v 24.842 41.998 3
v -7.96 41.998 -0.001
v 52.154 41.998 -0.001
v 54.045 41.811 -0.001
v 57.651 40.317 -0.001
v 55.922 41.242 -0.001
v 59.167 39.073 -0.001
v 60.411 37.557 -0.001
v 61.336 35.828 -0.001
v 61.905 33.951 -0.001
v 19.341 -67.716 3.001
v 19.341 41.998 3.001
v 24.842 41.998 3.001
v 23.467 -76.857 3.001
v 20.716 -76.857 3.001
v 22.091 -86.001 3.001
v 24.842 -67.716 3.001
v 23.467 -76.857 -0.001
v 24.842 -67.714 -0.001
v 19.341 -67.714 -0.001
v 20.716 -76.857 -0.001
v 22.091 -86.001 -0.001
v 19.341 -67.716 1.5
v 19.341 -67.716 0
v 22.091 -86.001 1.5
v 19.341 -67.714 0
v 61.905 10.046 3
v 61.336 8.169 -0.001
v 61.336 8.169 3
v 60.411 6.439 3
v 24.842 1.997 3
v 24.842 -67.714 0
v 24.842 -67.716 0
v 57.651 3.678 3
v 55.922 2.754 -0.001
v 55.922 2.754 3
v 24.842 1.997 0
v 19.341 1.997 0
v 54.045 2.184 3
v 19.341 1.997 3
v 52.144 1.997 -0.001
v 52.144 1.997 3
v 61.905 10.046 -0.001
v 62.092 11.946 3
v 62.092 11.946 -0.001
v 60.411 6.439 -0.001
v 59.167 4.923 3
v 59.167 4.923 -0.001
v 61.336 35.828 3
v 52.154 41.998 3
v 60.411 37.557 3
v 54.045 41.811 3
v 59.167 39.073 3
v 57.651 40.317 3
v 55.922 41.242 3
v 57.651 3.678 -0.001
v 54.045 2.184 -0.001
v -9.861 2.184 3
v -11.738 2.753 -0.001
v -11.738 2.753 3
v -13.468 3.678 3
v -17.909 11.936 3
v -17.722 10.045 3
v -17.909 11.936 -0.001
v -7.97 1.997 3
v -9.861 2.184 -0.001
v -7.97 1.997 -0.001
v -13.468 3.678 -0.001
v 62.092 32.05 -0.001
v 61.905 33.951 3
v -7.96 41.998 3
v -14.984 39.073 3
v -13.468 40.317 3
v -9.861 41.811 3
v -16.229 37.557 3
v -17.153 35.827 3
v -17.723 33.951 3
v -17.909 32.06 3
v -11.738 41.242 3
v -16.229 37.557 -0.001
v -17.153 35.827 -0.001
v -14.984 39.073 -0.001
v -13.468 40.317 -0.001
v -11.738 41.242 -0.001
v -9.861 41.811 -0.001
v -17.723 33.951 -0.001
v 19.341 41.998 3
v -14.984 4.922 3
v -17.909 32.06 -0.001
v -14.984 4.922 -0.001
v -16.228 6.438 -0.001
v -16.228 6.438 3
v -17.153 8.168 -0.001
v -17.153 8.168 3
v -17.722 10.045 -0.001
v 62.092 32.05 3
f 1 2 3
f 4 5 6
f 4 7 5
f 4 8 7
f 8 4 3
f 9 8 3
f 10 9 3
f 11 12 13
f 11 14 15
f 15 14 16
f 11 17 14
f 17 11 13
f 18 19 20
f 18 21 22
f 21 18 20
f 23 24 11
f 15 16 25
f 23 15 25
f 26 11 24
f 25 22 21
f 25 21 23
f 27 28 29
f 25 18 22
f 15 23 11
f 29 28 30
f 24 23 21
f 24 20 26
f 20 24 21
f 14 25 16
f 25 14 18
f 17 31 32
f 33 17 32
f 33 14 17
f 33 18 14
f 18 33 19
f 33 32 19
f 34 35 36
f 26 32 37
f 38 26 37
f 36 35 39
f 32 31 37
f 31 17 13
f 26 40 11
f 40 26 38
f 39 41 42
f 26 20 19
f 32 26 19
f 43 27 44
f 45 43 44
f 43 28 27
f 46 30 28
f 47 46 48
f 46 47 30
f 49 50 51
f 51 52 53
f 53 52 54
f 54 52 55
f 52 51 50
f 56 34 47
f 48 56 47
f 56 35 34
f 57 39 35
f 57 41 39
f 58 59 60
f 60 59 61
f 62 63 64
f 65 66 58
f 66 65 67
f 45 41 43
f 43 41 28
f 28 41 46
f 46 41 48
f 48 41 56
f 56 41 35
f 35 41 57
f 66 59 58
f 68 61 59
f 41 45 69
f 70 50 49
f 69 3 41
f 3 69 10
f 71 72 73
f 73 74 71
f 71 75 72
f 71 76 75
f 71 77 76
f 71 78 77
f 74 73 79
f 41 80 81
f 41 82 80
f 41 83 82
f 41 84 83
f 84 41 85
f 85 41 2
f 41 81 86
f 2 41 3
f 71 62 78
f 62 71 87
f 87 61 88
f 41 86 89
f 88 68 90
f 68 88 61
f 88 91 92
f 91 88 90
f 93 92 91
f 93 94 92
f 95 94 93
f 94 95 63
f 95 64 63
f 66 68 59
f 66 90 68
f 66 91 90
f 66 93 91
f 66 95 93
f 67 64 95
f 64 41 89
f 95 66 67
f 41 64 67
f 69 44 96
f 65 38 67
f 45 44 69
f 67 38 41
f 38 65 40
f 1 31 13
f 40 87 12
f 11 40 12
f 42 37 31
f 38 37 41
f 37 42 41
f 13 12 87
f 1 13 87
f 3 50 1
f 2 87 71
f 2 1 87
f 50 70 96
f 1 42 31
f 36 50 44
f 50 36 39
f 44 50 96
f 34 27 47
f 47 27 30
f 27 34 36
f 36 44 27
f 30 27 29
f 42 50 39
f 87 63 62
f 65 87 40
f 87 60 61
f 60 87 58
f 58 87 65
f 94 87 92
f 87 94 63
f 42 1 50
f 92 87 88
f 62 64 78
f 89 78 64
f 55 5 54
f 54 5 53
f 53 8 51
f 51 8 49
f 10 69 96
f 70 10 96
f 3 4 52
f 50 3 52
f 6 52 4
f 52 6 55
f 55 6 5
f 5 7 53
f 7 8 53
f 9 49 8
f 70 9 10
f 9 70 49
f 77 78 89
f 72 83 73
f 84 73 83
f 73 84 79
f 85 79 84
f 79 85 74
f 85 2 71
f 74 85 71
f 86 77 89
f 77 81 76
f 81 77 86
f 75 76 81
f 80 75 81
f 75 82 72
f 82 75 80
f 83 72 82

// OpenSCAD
module object1(scale) {polyhedron(
 points=[[52.153682708740234,41.99800109863281,-0.0010000000474974513],[-7.959833145141602,41.99800109863281,-0.0010000000474974513],[24.841999053955078,41.99800109863281,3],[24.841999053955078,-67.71600341796875,3.000999927520752],[24.841999053955078,41.99800109863281,3.000999927520752],[24.841699600219727,-67.71600341796875,3.000999927520752],[55.922000885009766,41.242000579833984,-0.0010000000474974513],[57.6510009765625,40.31700134277344,-0.0010000000474974513],[54.04499816894531,41.81100082397461,-0.0010000000474974513],[57.6510009765625,40.31700134277344,-0.0010000000474974513],[59.16699981689453,39.073001861572266,-0.0010000000474974513],[54.04499816894531,41.81100082397461,-0.0010000000474974513],[59.16699981689453,39.073001861572266,-0.0010000000474974513],[60.4109992980957,37.55699920654297,-0.0010000000474974513],[54.04499816894531,41.81100082397461,-0.0010000000474974513],[52.153682708740234,41.99800109863281,-0.0010000000474974513],[54.04499816894531,41.81100082397461,-0.0010000000474974513],[60.4109992980957,37.55699920654297,-0.0010000000474974513],[52.153682708740234,41.99800109863281,-0.0010000000474974513],[60.4109992980957,37.55699920654297,-0.0010000000474974513],[61.33599853515625,35.827999114990234,-0.0010000000474974513],[52.153682708740234,41.99800109863281,-0.0010000000474974513],[61.33599853515625,35.827999114990234,-0.0010000000474974513],[61.904998779296875,33.95100021362305,-0.0010000000474974513],[24.841999053955078,41.99800109863281,3.000999927520752],[19.340999603271484,41.99800109863281,3.000999927520752],[19.34130096435547,-67.71600341796875,3.000999927520752],[20.715999603271484,-76.85700225830078,3.000999927520752],[23.466999053955078,-76.85700225830078,3.000999927520752],[19.34130096435547,-67.71600341796875,3.000999927520752],[22.090999603271484,-86.0009994506836,3.000999927520752],[23.466999053955078,-76.85700225830078,3.000999927520752],[20.715999603271484,-76.85700225830078,3.000999927520752],[23.466999053955078,-76.85700225830078,3.000999927520752],[24.841699600219727,-67.71600341796875,3.000999927520752],[19.34130096435547,-67.71600341796875,3.000999927520752],[24.841999053955078,41.99800109863281,3.000999927520752],[19.34130096435547,-67.71600341796875,3.000999927520752],[24.841699600219727,-67.71600341796875,3.000999927520752],[19.340999603271484,-67.71399688720703,-0.0010000000474974513],[24.841999053955078,-67.71399688720703,-0.0010000000474974513],[23.466999053955078,-76.85700225830078,-0.0010000000474974513],[22.090999603271484,-86.0009994506836,-0.0010000000474974513],[20.715999603271484,-76.85700225830078,-0.0010000000474974513],[23.466999053955078,-76.85700225830078,-0.0010000000474974513],[19.340999603271484,-67.71399688720703,-0.0010000000474974513],[23.466999053955078,-76.85700225830078,-0.0010000000474974513],[20.715999603271484,-76.85700225830078,-0.0010000000474974513],[19.34130096435547,-67.71600341796875,0],[19.34130096435547,-67.71600341796875,1.5],[19.340999603271484,-67.71600341796875,0],[19.340999603271484,-67.71600341796875,3.000999927520752],[19.340999603271484,-67.71600341796875,0],[19.34130096435547,-67.71600341796875,1.5],[19.340999603271484,-67.71600341796875,3.000999927520752],[19.34130096435547,-67.71600341796875,1.5],[19.34130096435547,-67.71600341796875,1.5003283023834229],[19.340999603271484,-67.71600341796875,3.000999927520752],[19.34130096435547,-67.71600341796875,1.5003283023834229],[19.34130096435547,-67.71600341796875,3.000999927520752],[22.090999603271484,-86.0009994506836,1.5],[22.090999603271484,-86.0009994506836,3.000999927520752],[20.715999603271484,-76.85700225830078,3.000999927520752],[22.090999603271484,-86.0009994506836,1.5],[20.715999603271484,-76.85700225830078,3.000999927520752],[19.34130096435547,-67.71600341796875,1.5],[19.34130096435547,-67.71600341796875,1.5003283023834229],[19.34130096435547,-67.71600341796875,1.5],[20.715999603271484,-76.85700225830078,3.000999927520752],[19.34130096435547,-67.71600341796875,1.4996716976165771],[19.34130096435547,-67.71600341796875,1.5],[19.34130096435547,-67.71600341796875,0],[19.340999603271484,-67.71399688720703,0],[19.34130096435547,-67.71600341796875,0],[19.340999603271484,-67.71600341796875,0],[19.340999603271484,-67.71600341796875,0],[19.340999603271484,-67.71600341796875,3.000999927520752],[19.340999603271484,-67.71399688720703,0],[20.715999603271484,-76.85700225830078,-0.0010000000474974513],[22.090999603271484,-86.0009994506836,-0.0010000000474974513],[22.090999603271484,-86.0009994506836,1.5],[19.34130096435547,-67.71600341796875,1.5],[19.34130096435547,-67.71600341796875,1.4996716976165771],[20.715999603271484,-76.85700225830078,-0.0010000000474974513],[19.34130096435547,-67.71600341796875,1.5],[20.715999603271484,-76.85700225830078,-0.0010000000474974513],[22.090999603271484,-86.0009994506836,1.5],[61.33599853515625,8.168999671936035,3],[61.33599853515625,8.168999671936035,-0.0010000000474974513],[61.904998779296875,10.045999526977539,3],[22.090999603271484,-86.0009994506836,-0.0010000000474974513],[23.466999053955078,-76.85700225830078,-0.0010000000474974513],[22.090999603271484,-86.0009994506836,1.5],[19.34130096435547,-67.71600341796875,3.000999927520752],[19.34130096435547,-67.71600341796875,1.5003283023834229],[20.715999603271484,-76.85700225830078,3.000999927520752],[60.4109992980957,6.439000129699707,3],[61.33599853515625,8.168999671936035,-0.0010000000474974513],[61.33599853515625,8.168999671936035,3],[20.715999603271484,-76.85700225830078,-0.0010000000474974513],[19.34130096435547,-67.71600341796875,1.4996716976165771],[19.34130096435547,-67.71600341796875,0],[19.340999603271484,-67.71399688720703,0],[19.340999603271484,-67.71399688720703,-0.0010000000474974513],[19.34130096435547,-67.71600341796875,0],[20.715999603271484,-76.85700225830078,-0.0010000000474974513],[19.34130096435547,-67.71600341796875,0],[19.340999603271484,-67.71399688720703,-0.0010000000474974513],[22.090999603271484,-86.0009994506836,3.000999927520752],[22.090999603271484,-86.0009994506836,1.5],[23.466999053955078,-76.85700225830078,3.000999927520752],[23.466999053955078,-76.85700225830078,-0.0010000000474974513],[23.466999053955078,-76.85700225830078,3.000999927520752],[22.090999603271484,-86.0009994506836,1.5],[24.841699600219727,-67.71600341796875,3.000999927520752],[24.841699600219727,-67.71600341796875,0],[24.841999053955078,-67.71600341796875,0],[24.841699600219727,-67.71600341796875,3.000999927520752],[24.841999053955078,-67.71600341796875,0],[24.841999053955078,-67.71600341796875,3.000999927520752],[24.841999053955078,-67.71399688720703,0],[24.841999053955078,-67.71600341796875,0],[24.841699600219727,-67.71600341796875,0],[24.841999053955078,-67.71399688720703,0],[24.841999053955078,1.996999979019165,3],[24.841999053955078,-67.71600341796875,3.000999927520752],[24.841999053955078,-67.71399688720703,0],[24.841999053955078,-67.71600341796875,3.000999927520752],[24.841999053955078,-67.71600341796875,0],[24.841699600219727,-67.71600341796875,3.000999927520752],[23.466999053955078,-76.85700225830078,3.000999927520752],[24.841699600219727,-67.71600341796875,0],[23.466999053955078,-76.85700225830078,3.000999927520752],[23.466999053955078,-76.85700225830078,-0.0010000000474974513],[24.841699600219727,-67.71600341796875,0],[24.841999053955078,-67.71399688720703,-0.0010000000474974513],[24.841699600219727,-67.71600341796875,0],[23.466999053955078,-76.85700225830078,-0.0010000000474974513],[24.841999053955078,-67.71399688720703,-0.0010000000474974513],[24.841999053955078,-67.71399688720703,0],[24.841699600219727,-67.71600341796875,0],[55.922000885009766,2.753999948501587,3],[55.922000885009766,2.753999948501587,-0.0010000000474974513],[57.6510009765625,3.677999973297119,3],[24.841999053955078,1.996999979019165,0],[24.841999053955078,-67.71399688720703,0],[19.340999603271484,-67.71399688720703,0],[24.841999053955078,1.996999979019165,0],[19.340999603271484,-67.71399688720703,0],[19.340999603271484,1.996999979019165,0],[54.04499816894531,2.184000015258789,3],[55.922000885009766,2.753999948501587,-0.0010000000474974513],[55.922000885009766,2.753999948501587,3],[24.841999053955078,1.996999979019165,0],[24.841999053955078,1.996999979019165,3],[24.841999053955078,-67.71399688720703,0],[24.841999053955078,41.99800109863281,3.000999927520752],[24.841999053955078,-67.71600341796875,3.000999927520752],[24.841999053955078,1.996999979019165,3],[19.340999603271484,-67.71600341796875,3.000999927520752],[19.340999603271484,1.996999979019165,3],[19.340999603271484,-67.71399688720703,0],[19.340999603271484,1.996999979019165,0],[19.340999603271484,-67.71399688720703,0],[19.340999603271484,1.996999979019165,3],[52.14383316040039,1.996999979019165,3],[52.14383316040039,1.996999979019165,-0.0010000000474974513],[54.04499816894531,2.184000015258789,3],[24.841999053955078,-67.71399688720703,-0.0010000000474974513],[19.340999603271484,-67.71399688720703,-0.0010000000474974513],[19.340999603271484,-67.71399688720703,0],[24.841999053955078,-67.71399688720703,-0.0010000000474974513],[19.340999603271484,-67.71399688720703,0],[24.841999053955078,-67.71399688720703,0],[62.09199905395508,11.946192741394043,3],[61.904998779296875,10.045999526977539,3],[61.904998779296875,10.045999526977539,-0.0010000000474974513],[62.09199905395508,11.946192741394043,3],[61.904998779296875,10.045999526977539,-0.0010000000474974513],[62.09199905395508,11.946192741394043,-0.0010000000474974513],[61.904998779296875,10.045999526977539,3],[61.33599853515625,8.168999671936035,-0.0010000000474974513],[61.904998779296875,10.045999526977539,-0.0010000000474974513],[61.33599853515625,8.168999671936035,-0.0010000000474974513],[60.4109992980957,6.439000129699707,3],[60.4109992980957,6.439000129699707,-0.0010000000474974513],[59.16699981689453,4.922999858856201,-0.0010000000474974513],[60.4109992980957,6.439000129699707,-0.0010000000474974513],[59.16699981689453,4.922999858856201,3],[60.4109992980957,6.439000129699707,3],[59.16699981689453,4.922999858856201,3],[60.4109992980957,6.439000129699707,-0.0010000000474974513],[60.4109992980957,37.55699920654297,3],[52.153682708740234,41.99800109863281,3],[61.33599853515625,35.827999114990234,3],[59.16699981689453,39.073001861572266,3],[54.04499816894531,41.81100082397461,3],[60.4109992980957,37.55699920654297,3],[57.6510009765625,40.31700134277344,3],[54.04499816894531,41.81100082397461,3],[59.16699981689453,39.073001861572266,3],[55.922000885009766,41.242000579833984,3],[54.04499816894531,41.81100082397461,3],[57.6510009765625,40.31700134277344,3],[52.153682708740234,41.99800109863281,3],[60.4109992980957,37.55699920654297,3],[54.04499816894531,41.81100082397461,3],[59.16699981689453,4.922999858856201,3],[57.6510009765625,3.677999973297119,3],[57.6510009765625,3.677999973297119,-0.0010000000474974513],[59.16699981689453,4.922999858856201,3],[57.6510009765625,3.677999973297119,-0.0010000000474974513],[59.16699981689453,4.922999858856201,-0.0010000000474974513],[57.6510009765625,3.677999973297119,3],[55.922000885009766,2.753999948501587,-0.0010000000474974513],[57.6510009765625,3.677999973297119,-0.0010000000474974513],[55.922000885009766,2.753999948501587,-0.0010000000474974513],[54.04499816894531,2.184000015258789,3],[54.04499816894531,2.184000015258789,-0.0010000000474974513],[54.04499816894531,2.184000015258789,3],[52.14383316040039,1.996999979019165,-0.0010000000474974513],[54.04499816894531,2.184000015258789,-0.0010000000474974513],[-11.73799991607666,2.753000020980835,3],[-11.73799991607666,2.753000020980835,-0.0010000000474974513],[-9.861000061035156,2.184000015258789,3],[-13.468000411987305,3.677999973297119,3],[-11.73799991607666,2.753000020980835,-0.0010000000474974513],[-11.73799991607666,2.753000020980835,3],[-17.909000396728516,11.93631649017334,-0.0010000000474974513],[-17.722000122070312,10.045000076293945,3],[-17.909000396728516,11.93631649017334,3],[-9.861000061035156,2.184000015258789,3],[-9.861000061035156,2.184000015258789,-0.0010000000474974513],[-7.96968412399292,1.996999979019165,3],[-7.96968412399292,1.996999979019165,-0.0010000000474974513],[-7.96968412399292,1.996999979019165,3],[-9.861000061035156,2.184000015258789,-0.0010000000474974513],[61.904998779296875,10.045999526977539,-0.0010000000474974513],[52.14383316040039,1.996999979019165,-0.0010000000474974513],[62.09199905395508,11.946192741394043,-0.0010000000474974513],[61.33599853515625,8.168999671936035,-0.0010000000474974513],[52.14383316040039,1.996999979019165,-0.0010000000474974513],[61.904998779296875,10.045999526977539,-0.0010000000474974513],[60.4109992980957,6.439000129699707,-0.0010000000474974513],[52.14383316040039,1.996999979019165,-0.0010000000474974513],[61.33599853515625,8.168999671936035,-0.0010000000474974513],[59.16699981689453,4.922999858856201,-0.0010000000474974513],[52.14383316040039,1.996999979019165,-0.0010000000474974513],[60.4109992980957,6.439000129699707,-0.0010000000474974513],[57.6510009765625,3.677999973297119,-0.0010000000474974513],[52.14383316040039,1.996999979019165,-0.0010000000474974513],[59.16699981689453,4.922999858856201,-0.0010000000474974513],[55.922000885009766,2.753999948501587,-0.0010000000474974513],[52.14383316040039,1.996999979019165,-0.0010000000474974513],[57.6510009765625,3.677999973297119,-0.0010000000474974513],[54.04499816894531,2.184000015258789,-0.0010000000474974513],[52.14383316040039,1.996999979019165,-0.0010000000474974513],[55.922000885009766,2.753999948501587,-0.0010000000474974513],[-9.861000061035156,2.184000015258789,3],[-11.73799991607666,2.753000020980835,-0.0010000000474974513],[-9.861000061035156,2.184000015258789,-0.0010000000474974513],[-11.73799991607666,2.753000020980835,-0.0010000000474974513],[-13.468000411987305,3.677999973297119,3],[-13.468000411987305,3.677999973297119,-0.0010000000474974513],[62.09199905395508,32.049835205078125,-0.0010000000474974513],[62.09199905395508,11.946192741394043,-0.0010000000474974513],[52.14383316040039,1.996999979019165,-0.0010000000474974513],[61.33599853515625,35.827999114990234,3],[52.153682708740234,41.99800109863281,3],[61.904998779296875,33.95100021362305,3],[52.14383316040039,1.996999979019165,-0.0010000000474974513],[52.153682708740234,41.99800109863281,-0.0010000000474974513],[62.09199905395508,32.049835205078125,-0.0010000000474974513],[61.904998779296875,33.95100021362305,-0.0010000000474974513],[62.09199905395508,32.049835205078125,-0.0010000000474974513],[52.153682708740234,41.99800109863281,-0.0010000000474974513],[-13.468000411987305,40.31700134277344,3],[-14.984000205993652,39.073001861572266,3],[-7.959833145141602,41.99800109863281,3],[-7.959833145141602,41.99800109863281,3],[-9.861000061035156,41.81100082397461,3],[-13.468000411987305,40.31700134277344,3],[-14.984000205993652,39.073001861572266,3],[-16.229000091552734,37.55699920654297,3],[-7.959833145141602,41.99800109863281,3],[-16.229000091552734,37.55699920654297,3],[-17.152999877929688,35.82699966430664,3],[-7.959833145141602,41.99800109863281,3],[-17.152999877929688,35.82699966430664,3],[-17.722999572753906,33.95100021362305,3],[-7.959833145141602,41.99800109863281,3],[-17.722999572753906,33.95100021362305,3],[-17.909000396728516,32.060001373291016,3],[-7.959833145141602,41.99800109863281,3],[-11.73799991607666,41.242000579833984,3],[-13.468000411987305,40.31700134277344,3],[-9.861000061035156,41.81100082397461,3],[-17.152999877929688,35.82699966430664,-0.0010000000474974513],[-16.229000091552734,37.55699920654297,-0.0010000000474974513],[52.14383316040039,1.996999979019165,-0.0010000000474974513],[-16.229000091552734,37.55699920654297,-0.0010000000474974513],[-14.984000205993652,39.073001861572266,-0.0010000000474974513],[52.14383316040039,1.996999979019165,-0.0010000000474974513],[-14.984000205993652,39.073001861572266,-0.0010000000474974513],[-13.468000411987305,40.31700134277344,-0.0010000000474974513],[52.14383316040039,1.996999979019165,-0.0010000000474974513],[-13.468000411987305,40.31700134277344,-0.0010000000474974513],[-11.73799991607666,41.242000579833984,-0.0010000000474974513],[52.14383316040039,1.996999979019165,-0.0010000000474974513],[-9.861000061035156,41.81100082397461,-0.0010000000474974513],[52.14383316040039,1.996999979019165,-0.0010000000474974513],[-11.73799991607666,41.242000579833984,-0.0010000000474974513],[-7.959833145141602,41.99800109863281,-0.0010000000474974513],[52.14383316040039,1.996999979019165,-0.0010000000474974513],[-9.861000061035156,41.81100082397461,-0.0010000000474974513],[-17.722999572753906,33.95100021362305,-0.0010000000474974513],[-17.152999877929688,35.82699966430664,-0.0010000000474974513],[52.14383316040039,1.996999979019165,-0.0010000000474974513],[52.153682708740234,41.99800109863281,-0.0010000000474974513],[52.14383316040039,1.996999979019165,-0.0010000000474974513],[-7.959833145141602,41.99800109863281,-0.0010000000474974513],[-17.909000396728516,32.060001373291016,3],[-17.909000396728516,11.93631649017334,3],[-7.959833145141602,41.99800109863281,3],[19.340999603271484,41.99800109863281,3],[-7.959833145141602,41.99800109863281,3],[-17.909000396728516,11.93631649017334,3],[-14.984000205993652,4.921999931335449,3],[-13.468000411987305,3.677999973297119,3],[19.340999603271484,41.99800109863281,3],[-17.909000396728516,32.060001373291016,-0.0010000000474974513],[-17.722999572753906,33.95100021362305,-0.0010000000474974513],[52.14383316040039,1.996999979019165,-0.0010000000474974513],[-14.984000205993652,4.921999931335449,-0.0010000000474974513],[-13.468000411987305,3.677999973297119,-0.0010000000474974513],[-14.984000205993652,4.921999931335449,3],[-13.468000411987305,3.677999973297119,3],[-14.984000205993652,4.921999931335449,3],[-13.468000411987305,3.677999973297119,-0.0010000000474974513],[-16.22800064086914,6.438000202178955,3],[-16.22800064086914,6.438000202178955,-0.0010000000474974513],[-14.984000205993652,4.921999931335449,3],[-14.984000205993652,4.921999931335449,-0.0010000000474974513],[-14.984000205993652,4.921999931335449,3],[-16.22800064086914,6.438000202178955,-0.0010000000474974513],[-16.22800064086914,6.438000202178955,-0.0010000000474974513],[-16.22800064086914,6.438000202178955,3],[-17.152999877929688,8.168000221252441,-0.0010000000474974513],[-16.22800064086914,6.438000202178955,3],[-17.152999877929688,8.168000221252441,3],[-17.152999877929688,8.168000221252441,-0.0010000000474974513],[-17.152999877929688,8.168000221252441,-0.0010000000474974513],[-17.152999877929688,8.168000221252441,3],[-17.722000122070312,10.045000076293945,-0.0010000000474974513],[-17.722000122070312,10.045000076293945,3],[-17.722000122070312,10.045000076293945,-0.0010000000474974513],[-17.152999877929688,8.168000221252441,3],[-17.722000122070312,10.045000076293945,3],[-17.909000396728516,11.93631649017334,-0.0010000000474974513],[-17.722000122070312,10.045000076293945,-0.0010000000474974513],[-11.73799991607666,2.753000020980835,-0.0010000000474974513],[-13.468000411987305,3.677999973297119,-0.0010000000474974513],[-9.861000061035156,2.184000015258789,-0.0010000000474974513],[-13.468000411987305,3.677999973297119,-0.0010000000474974513],[-14.984000205993652,4.921999931335449,-0.0010000000474974513],[-9.861000061035156,2.184000015258789,-0.0010000000474974513],[-14.984000205993652,4.921999931335449,-0.0010000000474974513],[-16.22800064086914,6.438000202178955,-0.0010000000474974513],[-9.861000061035156,2.184000015258789,-0.0010000000474974513],[-16.22800064086914,6.438000202178955,-0.0010000000474974513],[-17.152999877929688,8.168000221252441,-0.0010000000474974513],[-9.861000061035156,2.184000015258789,-0.0010000000474974513],[-17.152999877929688,8.168000221252441,-0.0010000000474974513],[-17.722000122070312,10.045000076293945,-0.0010000000474974513],[-9.861000061035156,2.184000015258789,-0.0010000000474974513],[-17.722000122070312,10.045000076293945,-0.0010000000474974513],[-17.909000396728516,11.93631649017334,-0.0010000000474974513],[-7.96968412399292,1.996999979019165,-0.0010000000474974513],[-17.909000396728516,32.060001373291016,-0.0010000000474974513],[52.14383316040039,1.996999979019165,-0.0010000000474974513],[-17.909000396728516,11.93631649017334,-0.0010000000474974513],[-7.96968412399292,1.996999979019165,-0.0010000000474974513],[-9.861000061035156,2.184000015258789,-0.0010000000474974513],[-17.722000122070312,10.045000076293945,-0.0010000000474974513],[-7.96968412399292,1.996999979019165,-0.0010000000474974513],[-17.909000396728516,11.93631649017334,-0.0010000000474974513],[52.14383316040039,1.996999979019165,-0.0010000000474974513],[62.09199905395508,32.049835205078125,3],[62.09199905395508,11.946192741394043,3],[62.09199905395508,32.049835205078125,-0.0010000000474974513],[-7.96968412399292,1.996999979019165,-0.0010000000474974513],[19.340999603271484,1.996999979019165,0],[-7.96968412399292,1.996999979019165,3],[62.09199905395508,32.049835205078125,-0.0010000000474974513],[62.09199905395508,11.946192741394043,3],[62.09199905395508,11.946192741394043,-0.0010000000474974513],[52.14383316040039,1.996999979019165,-0.0010000000474974513],[19.340999603271484,1.996999979019165,0],[-7.96968412399292,1.996999979019165,-0.0010000000474974513],[19.340999603271484,1.996999979019165,3],[-7.96968412399292,1.996999979019165,3],[19.340999603271484,1.996999979019165,0],[24.841999053955078,41.99800109863281,3.000999927520752],[24.841999053955078,1.996999979019165,3],[24.841999053955078,41.99800109863281,3],[19.340999603271484,-67.71600341796875,3.000999927520752],[19.34130096435547,-67.71600341796875,3.000999927520752],[19.340999603271484,41.99800109863281,3.000999927520752],[19.340999603271484,41.99800109863281,3.000999927520752],[19.340999603271484,41.99800109863281,3],[19.340999603271484,1.996999979019165,3],[19.340999603271484,41.99800109863281,3.000999927520752],[19.340999603271484,1.996999979019165,3],[19.340999603271484,-67.71600341796875,3.000999927520752],[24.841999053955078,1.996999979019165,3],[24.841999053955078,1.996999979019165,0],[52.14383316040039,1.996999979019165,3],[52.14383316040039,1.996999979019165,-0.0010000000474974513],[24.841999053955078,1.996999979019165,0],[19.340999603271484,1.996999979019165,0],[52.14383316040039,1.996999979019165,-0.0010000000474974513],[52.14383316040039,1.996999979019165,3],[24.841999053955078,1.996999979019165,0],[19.340999603271484,41.99800109863281,3],[19.340999603271484,41.99800109863281,3.000999927520752],[24.841999053955078,41.99800109863281,3.000999927520752],[19.340999603271484,41.99800109863281,3],[24.841999053955078,41.99800109863281,3.000999927520752],[24.841999053955078,41.99800109863281,3],[24.841999053955078,41.99800109863281,3],[52.153682708740234,41.99800109863281,3],[52.153682708740234,41.99800109863281,-0.0010000000474974513],[-7.959833145141602,41.99800109863281,3],[19.340999603271484,41.99800109863281,3],[-7.959833145141602,41.99800109863281,-0.0010000000474974513],[19.340999603271484,41.99800109863281,3],[24.841999053955078,41.99800109863281,3],[-7.959833145141602,41.99800109863281,-0.0010000000474974513],[62.09199905395508,32.049835205078125,3],[61.904998779296875,33.95100021362305,3],[52.153682708740234,41.99800109863281,3],[24.841999053955078,1.996999979019165,3],[52.14383316040039,1.996999979019165,3],[24.841999053955078,41.99800109863281,3],[62.09199905395508,11.946192741394043,3],[52.153682708740234,41.99800109863281,3],[55.922000885009766,2.753999948501587,3],[54.04499816894531,2.184000015258789,3],[55.922000885009766,2.753999948501587,3],[52.153682708740234,41.99800109863281,3],[62.09199905395508,32.049835205078125,3],[52.153682708740234,41.99800109863281,3],[62.09199905395508,11.946192741394043,3],[59.16699981689453,4.922999858856201,3],[61.904998779296875,10.045999526977539,3],[57.6510009765625,3.677999973297119,3],[60.4109992980957,6.439000129699707,3],[61.904998779296875,10.045999526977539,3],[59.16699981689453,4.922999858856201,3],[55.922000885009766,2.753999948501587,3],[57.6510009765625,3.677999973297119,3],[61.904998779296875,10.045999526977539,3],[61.904998779296875,10.045999526977539,3],[62.09199905395508,11.946192741394043,3],[55.922000885009766,2.753999948501587,3],[61.33599853515625,8.168999671936035,3],[61.904998779296875,10.045999526977539,3],[60.4109992980957,6.439000129699707,3],[54.04499816894531,2.184000015258789,3],[52.153682708740234,41.99800109863281,3],[52.14383316040039,1.996999979019165,3],[-17.909000396728516,11.93631649017334,3],[-17.722000122070312,10.045000076293945,3],[19.340999603271484,41.99800109863281,3],[19.340999603271484,1.996999979019165,3],[19.340999603271484,41.99800109863281,3],[-7.96968412399292,1.996999979019165,3],[-13.468000411987305,3.677999973297119,3],[-11.73799991607666,2.753000020980835,3],[19.340999603271484,41.99800109863281,3],[-9.861000061035156,2.184000015258789,3],[19.340999603271484,41.99800109863281,3],[-11.73799991607666,2.753000020980835,3],[-7.96968412399292,1.996999979019165,3],[19.340999603271484,41.99800109863281,3],[-9.861000061035156,2.184000015258789,3],[-16.22800064086914,6.438000202178955,3],[19.340999603271484,41.99800109863281,3],[-17.152999877929688,8.168000221252441,3],[-17.722000122070312,10.045000076293945,3],[-17.152999877929688,8.168000221252441,3],[19.340999603271484,41.99800109863281,3],[52.153682708740234,41.99800109863281,3],[24.841999053955078,41.99800109863281,3],[52.14383316040039,1.996999979019165,3],[-14.984000205993652,4.921999931335449,3],[19.340999603271484,41.99800109863281,3],[-16.22800064086914,6.438000202178955,3],[-17.909000396728516,32.060001373291016,3],[-17.909000396728516,11.93631649017334,-0.0010000000474974513],[-17.909000396728516,11.93631649017334,3],[-17.909000396728516,11.93631649017334,-0.0010000000474974513],[-17.909000396728516,32.060001373291016,3],[-17.909000396728516,32.060001373291016,-0.0010000000474974513],[57.6510009765625,40.31700134277344,3],[57.6510009765625,40.31700134277344,-0.0010000000474974513],[55.922000885009766,41.242000579833984,3],[59.16699981689453,39.073001861572266,3],[57.6510009765625,40.31700134277344,-0.0010000000474974513],[57.6510009765625,40.31700134277344,3],[60.4109992980957,37.55699920654297,3],[60.4109992980957,37.55699920654297,-0.0010000000474974513],[59.16699981689453,39.073001861572266,3],[61.33599853515625,35.827999114990234,3],[60.4109992980957,37.55699920654297,-0.0010000000474974513],[60.4109992980957,37.55699920654297,3],[62.09199905395508,32.049835205078125,3],[62.09199905395508,32.049835205078125,-0.0010000000474974513],[61.904998779296875,33.95100021362305,-0.0010000000474974513],[62.09199905395508,32.049835205078125,3],[61.904998779296875,33.95100021362305,-0.0010000000474974513],[61.904998779296875,33.95100021362305,3],[54.04499816894531,41.81100082397461,3],[54.04499816894531,41.81100082397461,-0.0010000000474974513],[52.153682708740234,41.99800109863281,-0.0010000000474974513],[54.04499816894531,41.81100082397461,3],[52.153682708740234,41.99800109863281,-0.0010000000474974513],[52.153682708740234,41.99800109863281,3],[54.04499816894531,41.81100082397461,-0.0010000000474974513],[54.04499816894531,41.81100082397461,3],[55.922000885009766,41.242000579833984,-0.0010000000474974513],[55.922000885009766,41.242000579833984,3],[55.922000885009766,41.242000579833984,-0.0010000000474974513],[54.04499816894531,41.81100082397461,3],[57.6510009765625,40.31700134277344,-0.0010000000474974513],[55.922000885009766,41.242000579833984,-0.0010000000474974513],[55.922000885009766,41.242000579833984,3],[59.16699981689453,39.073001861572266,3],[59.16699981689453,39.073001861572266,-0.0010000000474974513],[57.6510009765625,40.31700134277344,-0.0010000000474974513],[59.16699981689453,39.073001861572266,3],[60.4109992980957,37.55699920654297,-0.0010000000474974513],[59.16699981689453,39.073001861572266,-0.0010000000474974513],[60.4109992980957,37.55699920654297,-0.0010000000474974513],[61.33599853515625,35.827999114990234,3],[61.33599853515625,35.827999114990234,-0.0010000000474974513],[61.904998779296875,33.95100021362305,-0.0010000000474974513],[61.33599853515625,35.827999114990234,-0.0010000000474974513],[61.904998779296875,33.95100021362305,3],[61.33599853515625,35.827999114990234,3],[61.904998779296875,33.95100021362305,3],[61.33599853515625,35.827999114990234,-0.0010000000474974513],[-17.909000396728516,32.060001373291016,-0.0010000000474974513],[-17.909000396728516,32.060001373291016,3],[-17.722999572753906,33.95100021362305,3],[-13.468000411987305,40.31700134277344,3],[-13.468000411987305,40.31700134277344,-0.0010000000474974513],[-14.984000205993652,39.073001861572266,3],[-13.468000411987305,40.31700134277344,-0.0010000000474974513],[-13.468000411987305,40.31700134277344,3],[-11.73799991607666,41.242000579833984,-0.0010000000474974513],[-11.73799991607666,41.242000579833984,3],[-11.73799991607666,41.242000579833984,-0.0010000000474974513],[-13.468000411987305,40.31700134277344,3],[-11.73799991607666,41.242000579833984,-0.0010000000474974513],[-11.73799991607666,41.242000579833984,3],[-9.861000061035156,41.81100082397461,-0.0010000000474974513],[-9.861000061035156,41.81100082397461,3],[-9.861000061035156,41.81100082397461,-0.0010000000474974513],[-11.73799991607666,41.242000579833984,3],[-7.959833145141602,41.99800109863281,3],[-7.959833145141602,41.99800109863281,-0.0010000000474974513],[-9.861000061035156,41.81100082397461,-0.0010000000474974513],[-7.959833145141602,41.99800109863281,3],[-9.861000061035156,41.81100082397461,-0.0010000000474974513],[-9.861000061035156,41.81100082397461,3],[-17.909000396728516,32.060001373291016,-0.0010000000474974513],[-17.722999572753906,33.95100021362305,3],[-17.722999572753906,33.95100021362305,-0.0010000000474974513],[-17.152999877929688,35.82699966430664,3],[-17.152999877929688,35.82699966430664,-0.0010000000474974513],[-17.722999572753906,33.95100021362305,3],[-17.722999572753906,33.95100021362305,-0.0010000000474974513],[-17.722999572753906,33.95100021362305,3],[-17.152999877929688,35.82699966430664,-0.0010000000474974513],[-17.152999877929688,35.82699966430664,-0.0010000000474974513],[-17.152999877929688,35.82699966430664,3],[-16.229000091552734,37.55699920654297,3],[-17.152999877929688,35.82699966430664,-0.0010000000474974513],[-16.229000091552734,37.55699920654297,3],[-16.229000091552734,37.55699920654297,-0.0010000000474974513],[-14.984000205993652,39.073001861572266,3],[-14.984000205993652,39.073001861572266,-0.0010000000474974513],[-16.229000091552734,37.55699920654297,3],[-16.229000091552734,37.55699920654297,-0.0010000000474974513],[-16.229000091552734,37.55699920654297,3],[-14.984000205993652,39.073001861572266,-0.0010000000474974513],[-14.984000205993652,39.073001861572266,-0.0010000000474974513],[-14.984000205993652,39.073001861572266,3],[-13.468000411987305,40.31700134277344,-0.0010000000474974513] ],
faces=[[0,1,2],[3,4,5],[6,7,8],[9,10,11],[12,13,14],[15,16,17],[18,19,20],[21,22,23],[24,25,26],[27,28,29],[30,31,32],[33,34,35],[36,37,38],[39,40,41],[42,43,44],[45,46,47],[48,49,50],[51,52,53],[54,55,56],[57,58,59],[60,61,62],[63,64,65],[66,67,68],[69,70,71],[72,73,74],[75,76,77],[78,79,80],[81,82,83],[84,85,86],[87,88,89],[90,91,92],[93,94,95],[96,97,98],[99,100,101],[102,103,104],[105,106,107],[108,109,110],[111,112,113],[114,115,116],[117,118,119],[120,121,122],[123,124,125],[126,127,128],[129,130,131],[132,133,134],[135,136,137],[138,139,140],[141,142,143],[144,145,146],[147,148,149],[150,151,152],[153,154,155],[156,157,158],[159,160,161],[162,163,164],[165,166,167],[168,169,170],[171,172,173],[174,175,176],[177,178,179],[180,181,182],[183,184,185],[186,187,188],[189,190,191],[192,193,194],[195,196,197],[198,199,200],[201,202,203],[204,205,206],[207,208,209],[210,211,212],[213,214,215],[216,217,218],[219,220,221],[222,223,224],[225,226,227],[228,229,230],[231,232,233],[234,235,236],[237,238,239],[240,241,242],[243,244,245],[246,247,248],[249,250,251],[252,253,254],[255,256,257],[258,259,260],[261,262,263],[264,265,266],[267,268,269],[270,271,272],[273,274,275],[276,277,278],[279,280,281],[282,283,284],[285,286,287],[288,289,290],[291,292,293],[294,295,296],[297,298,299],[300,301,302],[303,304,305],[306,307,308],[309,310,311],[312,313,314],[315,316,317],[318,319,320],[321,322,323],[324,325,326],[327,328,329],[330,331,332],[333,334,335],[336,337,338],[339,340,341],[342,343,344],[345,346,347],[348,349,350],[351,352,353],[354,355,356],[357,358,359],[360,361,362],[363,364,365],[366,367,368],[369,370,371],[372,373,374],[375,376,377],[378,379,380],[381,382,383],[384,385,386],[387,388,389],[390,391,392],[393,394,395],[396,397,398],[399,400,401],[402,403,404],[405,406,407],[408,409,410],[411,412,413],[414,415,416],[417,418,419],[420,421,422],[423,424,425],[426,427,428],[429,430,431],[432,433,434],[435,436,437],[438,439,440],[441,442,443],[444,445,446],[447,448,449],[450,451,452],[453,454,455],[456,457,458],[459,460,461],[462,463,464],[465,466,467],[468,469,470],[471,472,473],[474,475,476],[477,478,479],[480,481,482],[483,484,485],[486,487,488],[489,490,491],[492,493,494],[495,496,497],[498,499,500],[501,502,503],[504,505,506],[507,508,509],[510,511,512],[513,514,515],[516,517,518],[519,520,521],[522,523,524],[525,526,527],[528,529,530],[531,532,533],[534,535,536],[537,538,539],[540,541,542],[543,544,545],[546,547,548],[549,550,551],[552,553,554],[555,556,557],[558,559,560],[561,562,563],[564,565,566],[567,568,569],[570,571,572],[573,574,575],[576,577,578],[579,580,581],[582,583,584],[585,586,587],[588,589,590],[591,592,593],[594,595,596],[597,598,599]]);}

object1(1);
